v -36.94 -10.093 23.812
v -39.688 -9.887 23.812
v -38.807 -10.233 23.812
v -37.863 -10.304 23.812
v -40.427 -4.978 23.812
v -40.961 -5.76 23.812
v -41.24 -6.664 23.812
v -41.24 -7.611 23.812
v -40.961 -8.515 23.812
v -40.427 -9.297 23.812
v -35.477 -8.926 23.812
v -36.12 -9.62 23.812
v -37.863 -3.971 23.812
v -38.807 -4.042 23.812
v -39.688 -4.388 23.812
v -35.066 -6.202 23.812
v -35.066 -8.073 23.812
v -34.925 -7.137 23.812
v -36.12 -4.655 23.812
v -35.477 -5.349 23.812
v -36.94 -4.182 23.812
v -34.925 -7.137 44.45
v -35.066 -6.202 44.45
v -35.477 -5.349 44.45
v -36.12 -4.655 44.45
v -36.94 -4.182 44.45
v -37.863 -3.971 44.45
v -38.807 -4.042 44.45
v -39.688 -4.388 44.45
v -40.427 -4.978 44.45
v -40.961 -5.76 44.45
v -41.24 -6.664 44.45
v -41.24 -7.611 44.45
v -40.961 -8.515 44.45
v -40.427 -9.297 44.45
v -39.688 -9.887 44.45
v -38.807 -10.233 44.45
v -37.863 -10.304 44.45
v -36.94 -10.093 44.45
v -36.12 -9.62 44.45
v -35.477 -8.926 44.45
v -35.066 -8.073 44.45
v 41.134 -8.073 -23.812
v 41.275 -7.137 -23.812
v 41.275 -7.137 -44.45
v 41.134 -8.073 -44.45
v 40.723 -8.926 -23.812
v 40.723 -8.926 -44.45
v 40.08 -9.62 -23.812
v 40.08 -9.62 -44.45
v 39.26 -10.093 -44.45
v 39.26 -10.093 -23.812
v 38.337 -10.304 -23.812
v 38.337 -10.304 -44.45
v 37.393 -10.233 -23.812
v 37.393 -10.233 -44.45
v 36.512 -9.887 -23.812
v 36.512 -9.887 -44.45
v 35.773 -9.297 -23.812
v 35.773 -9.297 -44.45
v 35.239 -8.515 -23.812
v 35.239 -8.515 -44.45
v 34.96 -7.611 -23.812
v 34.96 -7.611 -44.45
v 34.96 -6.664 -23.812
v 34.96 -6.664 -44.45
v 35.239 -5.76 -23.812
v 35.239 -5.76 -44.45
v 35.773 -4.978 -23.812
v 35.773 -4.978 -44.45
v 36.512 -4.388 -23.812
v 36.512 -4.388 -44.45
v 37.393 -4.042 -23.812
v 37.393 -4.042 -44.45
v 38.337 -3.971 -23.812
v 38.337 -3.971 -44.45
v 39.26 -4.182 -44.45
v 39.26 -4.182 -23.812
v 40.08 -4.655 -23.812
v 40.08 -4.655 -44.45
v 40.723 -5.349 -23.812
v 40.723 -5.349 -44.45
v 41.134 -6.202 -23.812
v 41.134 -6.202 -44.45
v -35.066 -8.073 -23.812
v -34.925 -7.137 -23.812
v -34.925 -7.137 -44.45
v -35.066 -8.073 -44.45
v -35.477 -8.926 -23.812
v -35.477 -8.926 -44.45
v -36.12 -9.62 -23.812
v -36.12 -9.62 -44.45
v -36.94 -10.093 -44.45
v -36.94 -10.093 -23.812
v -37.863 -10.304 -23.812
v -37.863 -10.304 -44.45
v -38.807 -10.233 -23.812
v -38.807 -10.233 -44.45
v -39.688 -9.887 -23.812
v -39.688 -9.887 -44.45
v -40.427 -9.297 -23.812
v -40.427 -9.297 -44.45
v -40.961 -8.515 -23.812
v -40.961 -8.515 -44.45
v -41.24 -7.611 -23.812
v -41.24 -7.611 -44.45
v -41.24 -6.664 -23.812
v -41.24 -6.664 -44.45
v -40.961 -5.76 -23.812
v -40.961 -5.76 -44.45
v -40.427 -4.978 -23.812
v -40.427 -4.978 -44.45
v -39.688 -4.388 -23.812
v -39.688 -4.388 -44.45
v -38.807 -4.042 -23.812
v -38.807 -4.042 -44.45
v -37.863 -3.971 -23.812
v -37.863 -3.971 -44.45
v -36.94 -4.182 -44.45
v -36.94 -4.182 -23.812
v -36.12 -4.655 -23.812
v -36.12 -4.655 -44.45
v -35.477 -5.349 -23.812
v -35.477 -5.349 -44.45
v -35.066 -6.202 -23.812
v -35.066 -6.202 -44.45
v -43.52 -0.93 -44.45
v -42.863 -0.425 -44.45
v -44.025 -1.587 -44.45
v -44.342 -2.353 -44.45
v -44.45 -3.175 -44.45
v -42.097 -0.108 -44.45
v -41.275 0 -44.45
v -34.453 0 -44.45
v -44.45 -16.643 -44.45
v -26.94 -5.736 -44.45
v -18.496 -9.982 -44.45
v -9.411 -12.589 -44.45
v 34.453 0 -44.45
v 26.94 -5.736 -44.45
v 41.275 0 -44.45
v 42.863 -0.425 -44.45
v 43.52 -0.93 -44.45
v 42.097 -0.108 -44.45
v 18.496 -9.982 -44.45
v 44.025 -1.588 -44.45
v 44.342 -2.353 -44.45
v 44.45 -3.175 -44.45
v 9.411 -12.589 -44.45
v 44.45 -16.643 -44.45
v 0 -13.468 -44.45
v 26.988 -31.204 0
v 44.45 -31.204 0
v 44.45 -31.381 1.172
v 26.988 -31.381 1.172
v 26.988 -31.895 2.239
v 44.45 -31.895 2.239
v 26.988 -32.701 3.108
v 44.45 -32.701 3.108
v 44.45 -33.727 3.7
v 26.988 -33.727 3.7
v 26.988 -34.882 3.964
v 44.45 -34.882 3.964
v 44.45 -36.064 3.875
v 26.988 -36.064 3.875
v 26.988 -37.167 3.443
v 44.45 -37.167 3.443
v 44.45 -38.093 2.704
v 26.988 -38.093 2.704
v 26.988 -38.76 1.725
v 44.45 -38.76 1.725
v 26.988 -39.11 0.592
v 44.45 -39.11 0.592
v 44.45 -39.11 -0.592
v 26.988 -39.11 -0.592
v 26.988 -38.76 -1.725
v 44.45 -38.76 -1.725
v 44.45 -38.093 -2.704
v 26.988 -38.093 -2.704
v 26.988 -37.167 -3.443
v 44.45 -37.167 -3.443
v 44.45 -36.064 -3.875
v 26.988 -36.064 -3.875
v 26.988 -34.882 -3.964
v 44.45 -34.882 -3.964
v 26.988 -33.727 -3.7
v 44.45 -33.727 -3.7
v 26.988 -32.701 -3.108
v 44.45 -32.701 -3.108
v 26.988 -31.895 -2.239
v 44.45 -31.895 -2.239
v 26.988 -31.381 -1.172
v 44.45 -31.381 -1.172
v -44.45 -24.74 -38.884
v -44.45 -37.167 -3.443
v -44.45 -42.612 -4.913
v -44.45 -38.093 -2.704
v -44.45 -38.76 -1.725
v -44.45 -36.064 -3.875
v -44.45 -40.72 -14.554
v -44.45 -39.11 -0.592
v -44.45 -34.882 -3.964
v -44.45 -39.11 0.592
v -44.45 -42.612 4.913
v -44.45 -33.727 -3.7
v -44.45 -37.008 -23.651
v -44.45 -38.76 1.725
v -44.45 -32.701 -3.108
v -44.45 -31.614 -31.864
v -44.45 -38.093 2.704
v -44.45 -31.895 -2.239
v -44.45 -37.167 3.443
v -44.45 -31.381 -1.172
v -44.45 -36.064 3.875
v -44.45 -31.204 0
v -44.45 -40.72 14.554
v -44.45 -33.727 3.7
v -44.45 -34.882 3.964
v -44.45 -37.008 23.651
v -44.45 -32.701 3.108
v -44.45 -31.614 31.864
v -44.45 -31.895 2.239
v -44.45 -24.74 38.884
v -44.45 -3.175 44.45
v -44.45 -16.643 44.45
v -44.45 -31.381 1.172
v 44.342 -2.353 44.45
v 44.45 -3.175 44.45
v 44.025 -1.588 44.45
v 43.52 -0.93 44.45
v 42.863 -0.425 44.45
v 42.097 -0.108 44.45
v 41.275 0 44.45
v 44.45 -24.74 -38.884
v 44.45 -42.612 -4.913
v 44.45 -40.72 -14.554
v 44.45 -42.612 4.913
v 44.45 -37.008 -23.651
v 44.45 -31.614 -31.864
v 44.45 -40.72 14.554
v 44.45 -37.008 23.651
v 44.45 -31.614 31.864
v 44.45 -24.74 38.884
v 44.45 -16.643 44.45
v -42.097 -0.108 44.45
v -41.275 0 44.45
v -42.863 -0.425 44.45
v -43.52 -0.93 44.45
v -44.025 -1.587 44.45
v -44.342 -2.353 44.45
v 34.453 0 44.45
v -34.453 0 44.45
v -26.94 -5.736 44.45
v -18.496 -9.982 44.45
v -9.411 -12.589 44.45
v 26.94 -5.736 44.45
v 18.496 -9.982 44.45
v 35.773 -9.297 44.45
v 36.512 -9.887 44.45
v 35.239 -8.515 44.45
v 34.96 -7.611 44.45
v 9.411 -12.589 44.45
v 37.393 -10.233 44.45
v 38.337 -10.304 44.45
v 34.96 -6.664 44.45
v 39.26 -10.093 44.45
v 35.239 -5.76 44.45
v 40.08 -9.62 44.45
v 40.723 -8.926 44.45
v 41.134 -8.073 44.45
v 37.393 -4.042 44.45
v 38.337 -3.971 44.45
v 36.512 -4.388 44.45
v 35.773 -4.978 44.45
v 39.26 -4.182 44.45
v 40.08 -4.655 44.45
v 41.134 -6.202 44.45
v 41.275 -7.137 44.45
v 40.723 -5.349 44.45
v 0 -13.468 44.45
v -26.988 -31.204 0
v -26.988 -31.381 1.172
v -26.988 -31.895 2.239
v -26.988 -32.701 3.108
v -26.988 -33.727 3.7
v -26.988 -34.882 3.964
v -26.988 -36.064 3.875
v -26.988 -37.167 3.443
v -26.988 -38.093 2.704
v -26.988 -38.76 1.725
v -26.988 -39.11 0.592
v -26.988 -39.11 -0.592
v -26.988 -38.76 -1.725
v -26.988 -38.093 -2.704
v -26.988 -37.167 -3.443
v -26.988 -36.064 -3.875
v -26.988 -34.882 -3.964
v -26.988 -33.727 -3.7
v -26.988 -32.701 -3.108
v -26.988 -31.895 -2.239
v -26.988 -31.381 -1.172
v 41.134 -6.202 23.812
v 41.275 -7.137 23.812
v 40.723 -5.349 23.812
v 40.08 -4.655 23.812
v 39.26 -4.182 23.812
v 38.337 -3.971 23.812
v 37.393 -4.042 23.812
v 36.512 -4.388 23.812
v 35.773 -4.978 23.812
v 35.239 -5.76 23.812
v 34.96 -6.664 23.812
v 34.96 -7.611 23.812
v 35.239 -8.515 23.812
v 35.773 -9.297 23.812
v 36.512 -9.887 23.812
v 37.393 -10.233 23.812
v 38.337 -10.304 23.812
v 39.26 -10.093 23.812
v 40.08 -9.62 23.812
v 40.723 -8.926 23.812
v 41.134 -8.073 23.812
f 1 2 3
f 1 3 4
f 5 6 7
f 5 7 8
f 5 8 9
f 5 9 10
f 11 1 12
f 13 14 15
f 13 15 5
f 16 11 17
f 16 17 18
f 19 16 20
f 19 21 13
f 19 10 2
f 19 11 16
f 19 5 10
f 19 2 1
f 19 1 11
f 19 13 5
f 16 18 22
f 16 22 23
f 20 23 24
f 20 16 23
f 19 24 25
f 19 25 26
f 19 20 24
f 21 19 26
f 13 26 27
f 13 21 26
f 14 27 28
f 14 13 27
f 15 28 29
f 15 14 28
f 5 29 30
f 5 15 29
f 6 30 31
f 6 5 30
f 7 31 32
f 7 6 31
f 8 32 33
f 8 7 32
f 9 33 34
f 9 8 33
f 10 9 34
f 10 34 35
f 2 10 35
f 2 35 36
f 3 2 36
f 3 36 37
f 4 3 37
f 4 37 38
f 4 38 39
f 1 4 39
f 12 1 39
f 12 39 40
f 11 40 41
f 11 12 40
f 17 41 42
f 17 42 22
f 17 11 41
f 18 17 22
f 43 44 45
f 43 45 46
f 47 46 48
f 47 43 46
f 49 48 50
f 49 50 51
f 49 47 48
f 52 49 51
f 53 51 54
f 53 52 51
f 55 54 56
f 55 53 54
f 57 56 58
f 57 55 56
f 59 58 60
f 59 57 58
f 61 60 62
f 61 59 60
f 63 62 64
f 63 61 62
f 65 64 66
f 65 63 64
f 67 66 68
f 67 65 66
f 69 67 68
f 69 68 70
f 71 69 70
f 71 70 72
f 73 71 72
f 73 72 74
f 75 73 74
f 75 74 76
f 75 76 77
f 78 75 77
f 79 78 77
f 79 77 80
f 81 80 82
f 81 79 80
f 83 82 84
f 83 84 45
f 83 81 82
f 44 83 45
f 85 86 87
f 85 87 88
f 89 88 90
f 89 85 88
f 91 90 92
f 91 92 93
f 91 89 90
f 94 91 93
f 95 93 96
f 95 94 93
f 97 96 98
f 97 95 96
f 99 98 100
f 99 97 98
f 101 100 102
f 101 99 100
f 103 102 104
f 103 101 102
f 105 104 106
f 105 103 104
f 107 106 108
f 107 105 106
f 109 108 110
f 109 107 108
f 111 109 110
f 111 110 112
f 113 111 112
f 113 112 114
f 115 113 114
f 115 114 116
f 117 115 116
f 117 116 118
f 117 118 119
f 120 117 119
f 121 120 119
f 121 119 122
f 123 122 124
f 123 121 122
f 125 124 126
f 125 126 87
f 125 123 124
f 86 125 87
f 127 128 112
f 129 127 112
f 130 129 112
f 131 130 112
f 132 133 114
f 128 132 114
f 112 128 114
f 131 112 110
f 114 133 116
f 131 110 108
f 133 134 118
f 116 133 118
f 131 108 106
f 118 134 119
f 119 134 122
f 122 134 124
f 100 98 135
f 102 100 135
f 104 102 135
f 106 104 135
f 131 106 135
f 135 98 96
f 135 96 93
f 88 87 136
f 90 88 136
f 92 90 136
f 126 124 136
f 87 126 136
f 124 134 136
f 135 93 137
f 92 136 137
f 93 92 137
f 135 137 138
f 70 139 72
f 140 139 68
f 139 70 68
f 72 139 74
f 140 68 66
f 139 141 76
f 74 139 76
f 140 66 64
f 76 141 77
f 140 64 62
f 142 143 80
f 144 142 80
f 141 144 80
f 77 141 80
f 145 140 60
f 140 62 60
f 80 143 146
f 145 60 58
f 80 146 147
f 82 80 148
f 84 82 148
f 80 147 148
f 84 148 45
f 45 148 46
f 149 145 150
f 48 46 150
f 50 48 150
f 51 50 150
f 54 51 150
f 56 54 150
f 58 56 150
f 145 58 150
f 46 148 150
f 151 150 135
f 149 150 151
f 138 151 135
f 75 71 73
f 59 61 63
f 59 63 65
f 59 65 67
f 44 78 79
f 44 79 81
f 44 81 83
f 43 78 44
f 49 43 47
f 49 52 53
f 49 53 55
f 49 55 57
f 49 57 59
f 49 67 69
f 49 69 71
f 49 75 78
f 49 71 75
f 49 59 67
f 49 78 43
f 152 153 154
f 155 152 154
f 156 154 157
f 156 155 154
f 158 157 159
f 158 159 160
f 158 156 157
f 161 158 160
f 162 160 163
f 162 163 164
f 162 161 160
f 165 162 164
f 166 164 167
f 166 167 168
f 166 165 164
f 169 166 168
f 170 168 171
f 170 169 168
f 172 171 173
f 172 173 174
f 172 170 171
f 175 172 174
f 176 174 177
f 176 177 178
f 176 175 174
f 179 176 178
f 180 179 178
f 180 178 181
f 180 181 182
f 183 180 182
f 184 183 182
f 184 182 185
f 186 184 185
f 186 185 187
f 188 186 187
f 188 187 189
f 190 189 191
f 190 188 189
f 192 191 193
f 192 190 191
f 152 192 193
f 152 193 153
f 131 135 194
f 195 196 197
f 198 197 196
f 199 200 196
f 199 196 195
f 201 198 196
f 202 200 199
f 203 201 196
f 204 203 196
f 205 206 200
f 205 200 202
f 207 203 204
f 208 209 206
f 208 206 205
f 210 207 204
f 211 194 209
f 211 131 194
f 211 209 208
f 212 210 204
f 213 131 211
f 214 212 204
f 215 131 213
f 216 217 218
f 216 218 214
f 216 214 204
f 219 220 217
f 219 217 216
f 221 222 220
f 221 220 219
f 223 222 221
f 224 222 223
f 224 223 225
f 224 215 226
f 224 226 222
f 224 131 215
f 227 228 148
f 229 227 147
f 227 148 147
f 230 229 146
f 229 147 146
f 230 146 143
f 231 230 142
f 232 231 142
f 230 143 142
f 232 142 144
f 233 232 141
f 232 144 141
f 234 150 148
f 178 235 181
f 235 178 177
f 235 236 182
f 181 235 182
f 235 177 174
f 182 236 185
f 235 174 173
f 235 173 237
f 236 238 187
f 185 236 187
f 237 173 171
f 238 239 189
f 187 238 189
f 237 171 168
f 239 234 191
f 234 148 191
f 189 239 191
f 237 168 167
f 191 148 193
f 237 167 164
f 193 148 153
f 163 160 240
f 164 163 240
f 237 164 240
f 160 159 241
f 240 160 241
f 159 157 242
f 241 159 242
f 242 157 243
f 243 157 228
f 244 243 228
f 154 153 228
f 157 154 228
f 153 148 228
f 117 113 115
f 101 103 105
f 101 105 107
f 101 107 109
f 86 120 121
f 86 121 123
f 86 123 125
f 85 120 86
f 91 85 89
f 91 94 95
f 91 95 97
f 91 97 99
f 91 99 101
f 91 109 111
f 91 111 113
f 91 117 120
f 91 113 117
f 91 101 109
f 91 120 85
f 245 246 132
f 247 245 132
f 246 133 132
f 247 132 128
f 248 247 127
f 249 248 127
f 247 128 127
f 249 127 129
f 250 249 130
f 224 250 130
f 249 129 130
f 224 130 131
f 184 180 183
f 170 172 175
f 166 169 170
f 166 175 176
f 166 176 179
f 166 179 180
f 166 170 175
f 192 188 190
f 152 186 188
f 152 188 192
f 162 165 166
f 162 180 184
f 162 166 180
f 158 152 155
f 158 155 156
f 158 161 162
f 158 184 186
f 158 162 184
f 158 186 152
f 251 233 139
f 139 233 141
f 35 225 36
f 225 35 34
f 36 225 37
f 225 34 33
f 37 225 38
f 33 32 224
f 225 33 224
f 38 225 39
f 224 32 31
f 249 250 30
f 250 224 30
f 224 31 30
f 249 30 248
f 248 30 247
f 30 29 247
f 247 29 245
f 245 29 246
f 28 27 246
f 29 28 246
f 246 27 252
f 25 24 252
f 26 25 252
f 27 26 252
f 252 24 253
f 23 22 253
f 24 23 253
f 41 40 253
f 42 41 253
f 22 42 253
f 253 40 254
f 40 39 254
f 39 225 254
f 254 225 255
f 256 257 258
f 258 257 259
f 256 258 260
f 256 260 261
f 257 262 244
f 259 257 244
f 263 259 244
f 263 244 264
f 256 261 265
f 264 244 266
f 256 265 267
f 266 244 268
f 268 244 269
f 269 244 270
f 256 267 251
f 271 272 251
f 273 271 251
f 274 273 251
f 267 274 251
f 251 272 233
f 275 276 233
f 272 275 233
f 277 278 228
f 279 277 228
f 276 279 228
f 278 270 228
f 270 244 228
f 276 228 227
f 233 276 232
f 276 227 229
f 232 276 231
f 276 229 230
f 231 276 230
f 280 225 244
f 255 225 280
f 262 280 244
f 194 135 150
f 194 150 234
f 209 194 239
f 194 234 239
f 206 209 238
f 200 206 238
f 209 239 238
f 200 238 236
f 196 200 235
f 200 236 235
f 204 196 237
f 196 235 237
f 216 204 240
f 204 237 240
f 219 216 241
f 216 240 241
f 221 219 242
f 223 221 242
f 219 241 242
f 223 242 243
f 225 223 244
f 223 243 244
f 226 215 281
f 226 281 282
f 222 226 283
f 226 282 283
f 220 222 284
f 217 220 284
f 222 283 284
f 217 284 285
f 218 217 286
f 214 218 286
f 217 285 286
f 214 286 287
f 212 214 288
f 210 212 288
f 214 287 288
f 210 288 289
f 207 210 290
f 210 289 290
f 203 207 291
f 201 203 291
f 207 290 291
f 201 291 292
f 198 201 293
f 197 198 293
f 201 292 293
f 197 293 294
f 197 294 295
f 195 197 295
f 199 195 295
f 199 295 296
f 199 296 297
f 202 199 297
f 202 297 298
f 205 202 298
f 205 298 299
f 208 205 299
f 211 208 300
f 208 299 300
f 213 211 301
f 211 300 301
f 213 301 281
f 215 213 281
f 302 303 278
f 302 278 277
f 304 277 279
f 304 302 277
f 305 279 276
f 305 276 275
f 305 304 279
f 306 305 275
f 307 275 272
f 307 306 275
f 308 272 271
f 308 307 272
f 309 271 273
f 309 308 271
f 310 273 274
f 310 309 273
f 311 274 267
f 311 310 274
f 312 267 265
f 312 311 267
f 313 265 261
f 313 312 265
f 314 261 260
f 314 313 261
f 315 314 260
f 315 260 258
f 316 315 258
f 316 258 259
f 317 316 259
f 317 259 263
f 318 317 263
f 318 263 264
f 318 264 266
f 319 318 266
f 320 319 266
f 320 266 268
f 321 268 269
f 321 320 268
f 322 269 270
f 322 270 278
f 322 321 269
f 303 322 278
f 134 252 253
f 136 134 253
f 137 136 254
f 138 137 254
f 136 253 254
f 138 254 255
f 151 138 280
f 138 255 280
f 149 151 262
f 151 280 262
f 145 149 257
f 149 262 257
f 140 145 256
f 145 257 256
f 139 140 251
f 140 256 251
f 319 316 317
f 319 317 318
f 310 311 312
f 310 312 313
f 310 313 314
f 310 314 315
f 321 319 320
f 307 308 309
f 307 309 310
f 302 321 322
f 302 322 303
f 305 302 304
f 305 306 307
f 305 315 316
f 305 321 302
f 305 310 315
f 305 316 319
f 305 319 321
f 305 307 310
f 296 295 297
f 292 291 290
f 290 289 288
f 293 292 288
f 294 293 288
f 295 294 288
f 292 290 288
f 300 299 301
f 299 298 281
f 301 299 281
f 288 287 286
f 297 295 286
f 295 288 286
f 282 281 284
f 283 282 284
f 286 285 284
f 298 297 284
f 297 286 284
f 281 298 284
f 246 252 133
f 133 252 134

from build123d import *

# Parameters (mm, degrees)
BASE_EXTRUDE_DEPTH      = 44.45
CUT_EXTRUDE1_DEPTH      = 109.236398037
FILLET1_R               = 3.175
HOLE1_START             = 23.8125
HOLE1_OUTLINE_R         = 3.175
HOLE1_DEPTH             = 20.6375
LPATTERN1_COUNT         = 2
LPATTERN1_PITCH         = 76.2
MIRROR1_START           = 23.8125
MIRROR1_COPY_1_SKETCH_R = 3.175
MIRROR1_COPY_1_DEPTH    = 20.6375
MIRROR1_COPY_2_SKETCH_R = 3.175
MIRROR1_COPY_2_DEPTH    = 20.6375
HOLE2_START             = 26.9875
HOLE2_OUTLINE_R         = 3.9751
HOLE2_DEPTH             = 17.4625


# Read off the part's stored shape, not the designer's step: Hole1, Hole2
with BuildPart() as part:
    # Sketch1 → Base-Extrude (new, symmetric)
    with BuildSketch(Plane(origin=(0, 0, 0), x_dir=(0, 0, -1), z_dir=(1, 0, 0))):
        with BuildLine():
            Line((-44.45, 0), (44.45, 0))
            Line((44.45, 0), (44.45, -16.643244248))
            ThreePointArc((44.45, -16.643244248), (0, -42.8498), (-44.45, -16.643244248))
            Line((-44.45, -16.643244248), (-44.45, 0))
        make_face()
    extrude(amount=BASE_EXTRUDE_DEPTH, both=True)

    # Sketch2 → Cut-Extrude1 (cut, through all)
    with BuildSketch(Plane.XY.offset(44.45)):
        with BuildLine():
            Line((-173.766299507, 128.569272459), (-34.452576283, 0))
            ThreePointArc((-34.452576283, 0), (0, -13.468244248), (34.452576283, 0))
            Line((34.452576283, 0), (173.766299507, 128.569272459))
            Line((173.766299507, 128.569272459), (173.766299507, 507.717640776))
            Line((173.766299507, 507.717640776), (-173.766299507, 507.717640776))
            Line((-173.766299507, 507.717640776), (-173.766299507, 128.569272459))
        make_face()
    extrude(amount=-CUT_EXTRUDE1_DEPTH, mode=Mode.SUBTRACT)

    # Fillet1
    fillet1_edges = [part.edges().sort_by_distance(p)[0] for p in [
        (44.45, 0, 0),
        (-44.45, 0, 0),
    ]]
    fillet(fillet1_edges, radius=FILLET1_R)

    # Hole1 outline → Hole1 (cut)
    with BuildSketch(Plane.XY.offset(HOLE1_START)):
        with Locations((-38.1, -7.1374)):
            Circle(HOLE1_OUTLINE_R)
    hole1 = extrude(amount=HOLE1_DEPTH, mode=Mode.SUBTRACT)

    # LPattern1: Hole1 ×2
    with Locations(*[(i * LPATTERN1_PITCH, 0, 0) for i in range(1, LPATTERN1_COUNT)]):
        add(hole1, mode=Mode.SUBTRACT)

    # Mirror1 copy 1 sketch → Mirror1 copy 1 (cut)
    with BuildSketch(Plane(origin=(76.2, 0, 0), x_dir=(1, 0, 0), z_dir=(0, 0, -1)).offset(MIRROR1_START)):
        with Locations((-38.1, 7.1374)):
            Circle(MIRROR1_COPY_1_SKETCH_R)
    extrude(amount=MIRROR1_COPY_1_DEPTH, mode=Mode.SUBTRACT)

    # Mirror1 copy 2 sketch → Mirror1 copy 2 (cut)
    with BuildSketch(Plane(origin=(0, 0, 0), x_dir=(1, 0, 0), z_dir=(0, 0, -1)).offset(MIRROR1_START)):
        with Locations((-38.1, 7.1374)):
            Circle(MIRROR1_COPY_2_SKETCH_R)
    extrude(amount=MIRROR1_COPY_2_DEPTH, mode=Mode.SUBTRACT)

    # Hole2 outline → Hole2 (cut)
    with BuildSketch(Plane.YZ.offset(HOLE2_START)):
        with Locations((-35.179, 0)):
            Circle(HOLE2_OUTLINE_R)
    hole2 = extrude(amount=HOLE2_DEPTH, mode=Mode.SUBTRACT)

    # Mirror2: Hole2 across plane
    add(hole2.mirror(Plane(origin=(0, 0, 0), x_dir=(0, 0, 1), z_dir=(1, 0, 0))), mode=Mode.SUBTRACT)


solid = part.part
